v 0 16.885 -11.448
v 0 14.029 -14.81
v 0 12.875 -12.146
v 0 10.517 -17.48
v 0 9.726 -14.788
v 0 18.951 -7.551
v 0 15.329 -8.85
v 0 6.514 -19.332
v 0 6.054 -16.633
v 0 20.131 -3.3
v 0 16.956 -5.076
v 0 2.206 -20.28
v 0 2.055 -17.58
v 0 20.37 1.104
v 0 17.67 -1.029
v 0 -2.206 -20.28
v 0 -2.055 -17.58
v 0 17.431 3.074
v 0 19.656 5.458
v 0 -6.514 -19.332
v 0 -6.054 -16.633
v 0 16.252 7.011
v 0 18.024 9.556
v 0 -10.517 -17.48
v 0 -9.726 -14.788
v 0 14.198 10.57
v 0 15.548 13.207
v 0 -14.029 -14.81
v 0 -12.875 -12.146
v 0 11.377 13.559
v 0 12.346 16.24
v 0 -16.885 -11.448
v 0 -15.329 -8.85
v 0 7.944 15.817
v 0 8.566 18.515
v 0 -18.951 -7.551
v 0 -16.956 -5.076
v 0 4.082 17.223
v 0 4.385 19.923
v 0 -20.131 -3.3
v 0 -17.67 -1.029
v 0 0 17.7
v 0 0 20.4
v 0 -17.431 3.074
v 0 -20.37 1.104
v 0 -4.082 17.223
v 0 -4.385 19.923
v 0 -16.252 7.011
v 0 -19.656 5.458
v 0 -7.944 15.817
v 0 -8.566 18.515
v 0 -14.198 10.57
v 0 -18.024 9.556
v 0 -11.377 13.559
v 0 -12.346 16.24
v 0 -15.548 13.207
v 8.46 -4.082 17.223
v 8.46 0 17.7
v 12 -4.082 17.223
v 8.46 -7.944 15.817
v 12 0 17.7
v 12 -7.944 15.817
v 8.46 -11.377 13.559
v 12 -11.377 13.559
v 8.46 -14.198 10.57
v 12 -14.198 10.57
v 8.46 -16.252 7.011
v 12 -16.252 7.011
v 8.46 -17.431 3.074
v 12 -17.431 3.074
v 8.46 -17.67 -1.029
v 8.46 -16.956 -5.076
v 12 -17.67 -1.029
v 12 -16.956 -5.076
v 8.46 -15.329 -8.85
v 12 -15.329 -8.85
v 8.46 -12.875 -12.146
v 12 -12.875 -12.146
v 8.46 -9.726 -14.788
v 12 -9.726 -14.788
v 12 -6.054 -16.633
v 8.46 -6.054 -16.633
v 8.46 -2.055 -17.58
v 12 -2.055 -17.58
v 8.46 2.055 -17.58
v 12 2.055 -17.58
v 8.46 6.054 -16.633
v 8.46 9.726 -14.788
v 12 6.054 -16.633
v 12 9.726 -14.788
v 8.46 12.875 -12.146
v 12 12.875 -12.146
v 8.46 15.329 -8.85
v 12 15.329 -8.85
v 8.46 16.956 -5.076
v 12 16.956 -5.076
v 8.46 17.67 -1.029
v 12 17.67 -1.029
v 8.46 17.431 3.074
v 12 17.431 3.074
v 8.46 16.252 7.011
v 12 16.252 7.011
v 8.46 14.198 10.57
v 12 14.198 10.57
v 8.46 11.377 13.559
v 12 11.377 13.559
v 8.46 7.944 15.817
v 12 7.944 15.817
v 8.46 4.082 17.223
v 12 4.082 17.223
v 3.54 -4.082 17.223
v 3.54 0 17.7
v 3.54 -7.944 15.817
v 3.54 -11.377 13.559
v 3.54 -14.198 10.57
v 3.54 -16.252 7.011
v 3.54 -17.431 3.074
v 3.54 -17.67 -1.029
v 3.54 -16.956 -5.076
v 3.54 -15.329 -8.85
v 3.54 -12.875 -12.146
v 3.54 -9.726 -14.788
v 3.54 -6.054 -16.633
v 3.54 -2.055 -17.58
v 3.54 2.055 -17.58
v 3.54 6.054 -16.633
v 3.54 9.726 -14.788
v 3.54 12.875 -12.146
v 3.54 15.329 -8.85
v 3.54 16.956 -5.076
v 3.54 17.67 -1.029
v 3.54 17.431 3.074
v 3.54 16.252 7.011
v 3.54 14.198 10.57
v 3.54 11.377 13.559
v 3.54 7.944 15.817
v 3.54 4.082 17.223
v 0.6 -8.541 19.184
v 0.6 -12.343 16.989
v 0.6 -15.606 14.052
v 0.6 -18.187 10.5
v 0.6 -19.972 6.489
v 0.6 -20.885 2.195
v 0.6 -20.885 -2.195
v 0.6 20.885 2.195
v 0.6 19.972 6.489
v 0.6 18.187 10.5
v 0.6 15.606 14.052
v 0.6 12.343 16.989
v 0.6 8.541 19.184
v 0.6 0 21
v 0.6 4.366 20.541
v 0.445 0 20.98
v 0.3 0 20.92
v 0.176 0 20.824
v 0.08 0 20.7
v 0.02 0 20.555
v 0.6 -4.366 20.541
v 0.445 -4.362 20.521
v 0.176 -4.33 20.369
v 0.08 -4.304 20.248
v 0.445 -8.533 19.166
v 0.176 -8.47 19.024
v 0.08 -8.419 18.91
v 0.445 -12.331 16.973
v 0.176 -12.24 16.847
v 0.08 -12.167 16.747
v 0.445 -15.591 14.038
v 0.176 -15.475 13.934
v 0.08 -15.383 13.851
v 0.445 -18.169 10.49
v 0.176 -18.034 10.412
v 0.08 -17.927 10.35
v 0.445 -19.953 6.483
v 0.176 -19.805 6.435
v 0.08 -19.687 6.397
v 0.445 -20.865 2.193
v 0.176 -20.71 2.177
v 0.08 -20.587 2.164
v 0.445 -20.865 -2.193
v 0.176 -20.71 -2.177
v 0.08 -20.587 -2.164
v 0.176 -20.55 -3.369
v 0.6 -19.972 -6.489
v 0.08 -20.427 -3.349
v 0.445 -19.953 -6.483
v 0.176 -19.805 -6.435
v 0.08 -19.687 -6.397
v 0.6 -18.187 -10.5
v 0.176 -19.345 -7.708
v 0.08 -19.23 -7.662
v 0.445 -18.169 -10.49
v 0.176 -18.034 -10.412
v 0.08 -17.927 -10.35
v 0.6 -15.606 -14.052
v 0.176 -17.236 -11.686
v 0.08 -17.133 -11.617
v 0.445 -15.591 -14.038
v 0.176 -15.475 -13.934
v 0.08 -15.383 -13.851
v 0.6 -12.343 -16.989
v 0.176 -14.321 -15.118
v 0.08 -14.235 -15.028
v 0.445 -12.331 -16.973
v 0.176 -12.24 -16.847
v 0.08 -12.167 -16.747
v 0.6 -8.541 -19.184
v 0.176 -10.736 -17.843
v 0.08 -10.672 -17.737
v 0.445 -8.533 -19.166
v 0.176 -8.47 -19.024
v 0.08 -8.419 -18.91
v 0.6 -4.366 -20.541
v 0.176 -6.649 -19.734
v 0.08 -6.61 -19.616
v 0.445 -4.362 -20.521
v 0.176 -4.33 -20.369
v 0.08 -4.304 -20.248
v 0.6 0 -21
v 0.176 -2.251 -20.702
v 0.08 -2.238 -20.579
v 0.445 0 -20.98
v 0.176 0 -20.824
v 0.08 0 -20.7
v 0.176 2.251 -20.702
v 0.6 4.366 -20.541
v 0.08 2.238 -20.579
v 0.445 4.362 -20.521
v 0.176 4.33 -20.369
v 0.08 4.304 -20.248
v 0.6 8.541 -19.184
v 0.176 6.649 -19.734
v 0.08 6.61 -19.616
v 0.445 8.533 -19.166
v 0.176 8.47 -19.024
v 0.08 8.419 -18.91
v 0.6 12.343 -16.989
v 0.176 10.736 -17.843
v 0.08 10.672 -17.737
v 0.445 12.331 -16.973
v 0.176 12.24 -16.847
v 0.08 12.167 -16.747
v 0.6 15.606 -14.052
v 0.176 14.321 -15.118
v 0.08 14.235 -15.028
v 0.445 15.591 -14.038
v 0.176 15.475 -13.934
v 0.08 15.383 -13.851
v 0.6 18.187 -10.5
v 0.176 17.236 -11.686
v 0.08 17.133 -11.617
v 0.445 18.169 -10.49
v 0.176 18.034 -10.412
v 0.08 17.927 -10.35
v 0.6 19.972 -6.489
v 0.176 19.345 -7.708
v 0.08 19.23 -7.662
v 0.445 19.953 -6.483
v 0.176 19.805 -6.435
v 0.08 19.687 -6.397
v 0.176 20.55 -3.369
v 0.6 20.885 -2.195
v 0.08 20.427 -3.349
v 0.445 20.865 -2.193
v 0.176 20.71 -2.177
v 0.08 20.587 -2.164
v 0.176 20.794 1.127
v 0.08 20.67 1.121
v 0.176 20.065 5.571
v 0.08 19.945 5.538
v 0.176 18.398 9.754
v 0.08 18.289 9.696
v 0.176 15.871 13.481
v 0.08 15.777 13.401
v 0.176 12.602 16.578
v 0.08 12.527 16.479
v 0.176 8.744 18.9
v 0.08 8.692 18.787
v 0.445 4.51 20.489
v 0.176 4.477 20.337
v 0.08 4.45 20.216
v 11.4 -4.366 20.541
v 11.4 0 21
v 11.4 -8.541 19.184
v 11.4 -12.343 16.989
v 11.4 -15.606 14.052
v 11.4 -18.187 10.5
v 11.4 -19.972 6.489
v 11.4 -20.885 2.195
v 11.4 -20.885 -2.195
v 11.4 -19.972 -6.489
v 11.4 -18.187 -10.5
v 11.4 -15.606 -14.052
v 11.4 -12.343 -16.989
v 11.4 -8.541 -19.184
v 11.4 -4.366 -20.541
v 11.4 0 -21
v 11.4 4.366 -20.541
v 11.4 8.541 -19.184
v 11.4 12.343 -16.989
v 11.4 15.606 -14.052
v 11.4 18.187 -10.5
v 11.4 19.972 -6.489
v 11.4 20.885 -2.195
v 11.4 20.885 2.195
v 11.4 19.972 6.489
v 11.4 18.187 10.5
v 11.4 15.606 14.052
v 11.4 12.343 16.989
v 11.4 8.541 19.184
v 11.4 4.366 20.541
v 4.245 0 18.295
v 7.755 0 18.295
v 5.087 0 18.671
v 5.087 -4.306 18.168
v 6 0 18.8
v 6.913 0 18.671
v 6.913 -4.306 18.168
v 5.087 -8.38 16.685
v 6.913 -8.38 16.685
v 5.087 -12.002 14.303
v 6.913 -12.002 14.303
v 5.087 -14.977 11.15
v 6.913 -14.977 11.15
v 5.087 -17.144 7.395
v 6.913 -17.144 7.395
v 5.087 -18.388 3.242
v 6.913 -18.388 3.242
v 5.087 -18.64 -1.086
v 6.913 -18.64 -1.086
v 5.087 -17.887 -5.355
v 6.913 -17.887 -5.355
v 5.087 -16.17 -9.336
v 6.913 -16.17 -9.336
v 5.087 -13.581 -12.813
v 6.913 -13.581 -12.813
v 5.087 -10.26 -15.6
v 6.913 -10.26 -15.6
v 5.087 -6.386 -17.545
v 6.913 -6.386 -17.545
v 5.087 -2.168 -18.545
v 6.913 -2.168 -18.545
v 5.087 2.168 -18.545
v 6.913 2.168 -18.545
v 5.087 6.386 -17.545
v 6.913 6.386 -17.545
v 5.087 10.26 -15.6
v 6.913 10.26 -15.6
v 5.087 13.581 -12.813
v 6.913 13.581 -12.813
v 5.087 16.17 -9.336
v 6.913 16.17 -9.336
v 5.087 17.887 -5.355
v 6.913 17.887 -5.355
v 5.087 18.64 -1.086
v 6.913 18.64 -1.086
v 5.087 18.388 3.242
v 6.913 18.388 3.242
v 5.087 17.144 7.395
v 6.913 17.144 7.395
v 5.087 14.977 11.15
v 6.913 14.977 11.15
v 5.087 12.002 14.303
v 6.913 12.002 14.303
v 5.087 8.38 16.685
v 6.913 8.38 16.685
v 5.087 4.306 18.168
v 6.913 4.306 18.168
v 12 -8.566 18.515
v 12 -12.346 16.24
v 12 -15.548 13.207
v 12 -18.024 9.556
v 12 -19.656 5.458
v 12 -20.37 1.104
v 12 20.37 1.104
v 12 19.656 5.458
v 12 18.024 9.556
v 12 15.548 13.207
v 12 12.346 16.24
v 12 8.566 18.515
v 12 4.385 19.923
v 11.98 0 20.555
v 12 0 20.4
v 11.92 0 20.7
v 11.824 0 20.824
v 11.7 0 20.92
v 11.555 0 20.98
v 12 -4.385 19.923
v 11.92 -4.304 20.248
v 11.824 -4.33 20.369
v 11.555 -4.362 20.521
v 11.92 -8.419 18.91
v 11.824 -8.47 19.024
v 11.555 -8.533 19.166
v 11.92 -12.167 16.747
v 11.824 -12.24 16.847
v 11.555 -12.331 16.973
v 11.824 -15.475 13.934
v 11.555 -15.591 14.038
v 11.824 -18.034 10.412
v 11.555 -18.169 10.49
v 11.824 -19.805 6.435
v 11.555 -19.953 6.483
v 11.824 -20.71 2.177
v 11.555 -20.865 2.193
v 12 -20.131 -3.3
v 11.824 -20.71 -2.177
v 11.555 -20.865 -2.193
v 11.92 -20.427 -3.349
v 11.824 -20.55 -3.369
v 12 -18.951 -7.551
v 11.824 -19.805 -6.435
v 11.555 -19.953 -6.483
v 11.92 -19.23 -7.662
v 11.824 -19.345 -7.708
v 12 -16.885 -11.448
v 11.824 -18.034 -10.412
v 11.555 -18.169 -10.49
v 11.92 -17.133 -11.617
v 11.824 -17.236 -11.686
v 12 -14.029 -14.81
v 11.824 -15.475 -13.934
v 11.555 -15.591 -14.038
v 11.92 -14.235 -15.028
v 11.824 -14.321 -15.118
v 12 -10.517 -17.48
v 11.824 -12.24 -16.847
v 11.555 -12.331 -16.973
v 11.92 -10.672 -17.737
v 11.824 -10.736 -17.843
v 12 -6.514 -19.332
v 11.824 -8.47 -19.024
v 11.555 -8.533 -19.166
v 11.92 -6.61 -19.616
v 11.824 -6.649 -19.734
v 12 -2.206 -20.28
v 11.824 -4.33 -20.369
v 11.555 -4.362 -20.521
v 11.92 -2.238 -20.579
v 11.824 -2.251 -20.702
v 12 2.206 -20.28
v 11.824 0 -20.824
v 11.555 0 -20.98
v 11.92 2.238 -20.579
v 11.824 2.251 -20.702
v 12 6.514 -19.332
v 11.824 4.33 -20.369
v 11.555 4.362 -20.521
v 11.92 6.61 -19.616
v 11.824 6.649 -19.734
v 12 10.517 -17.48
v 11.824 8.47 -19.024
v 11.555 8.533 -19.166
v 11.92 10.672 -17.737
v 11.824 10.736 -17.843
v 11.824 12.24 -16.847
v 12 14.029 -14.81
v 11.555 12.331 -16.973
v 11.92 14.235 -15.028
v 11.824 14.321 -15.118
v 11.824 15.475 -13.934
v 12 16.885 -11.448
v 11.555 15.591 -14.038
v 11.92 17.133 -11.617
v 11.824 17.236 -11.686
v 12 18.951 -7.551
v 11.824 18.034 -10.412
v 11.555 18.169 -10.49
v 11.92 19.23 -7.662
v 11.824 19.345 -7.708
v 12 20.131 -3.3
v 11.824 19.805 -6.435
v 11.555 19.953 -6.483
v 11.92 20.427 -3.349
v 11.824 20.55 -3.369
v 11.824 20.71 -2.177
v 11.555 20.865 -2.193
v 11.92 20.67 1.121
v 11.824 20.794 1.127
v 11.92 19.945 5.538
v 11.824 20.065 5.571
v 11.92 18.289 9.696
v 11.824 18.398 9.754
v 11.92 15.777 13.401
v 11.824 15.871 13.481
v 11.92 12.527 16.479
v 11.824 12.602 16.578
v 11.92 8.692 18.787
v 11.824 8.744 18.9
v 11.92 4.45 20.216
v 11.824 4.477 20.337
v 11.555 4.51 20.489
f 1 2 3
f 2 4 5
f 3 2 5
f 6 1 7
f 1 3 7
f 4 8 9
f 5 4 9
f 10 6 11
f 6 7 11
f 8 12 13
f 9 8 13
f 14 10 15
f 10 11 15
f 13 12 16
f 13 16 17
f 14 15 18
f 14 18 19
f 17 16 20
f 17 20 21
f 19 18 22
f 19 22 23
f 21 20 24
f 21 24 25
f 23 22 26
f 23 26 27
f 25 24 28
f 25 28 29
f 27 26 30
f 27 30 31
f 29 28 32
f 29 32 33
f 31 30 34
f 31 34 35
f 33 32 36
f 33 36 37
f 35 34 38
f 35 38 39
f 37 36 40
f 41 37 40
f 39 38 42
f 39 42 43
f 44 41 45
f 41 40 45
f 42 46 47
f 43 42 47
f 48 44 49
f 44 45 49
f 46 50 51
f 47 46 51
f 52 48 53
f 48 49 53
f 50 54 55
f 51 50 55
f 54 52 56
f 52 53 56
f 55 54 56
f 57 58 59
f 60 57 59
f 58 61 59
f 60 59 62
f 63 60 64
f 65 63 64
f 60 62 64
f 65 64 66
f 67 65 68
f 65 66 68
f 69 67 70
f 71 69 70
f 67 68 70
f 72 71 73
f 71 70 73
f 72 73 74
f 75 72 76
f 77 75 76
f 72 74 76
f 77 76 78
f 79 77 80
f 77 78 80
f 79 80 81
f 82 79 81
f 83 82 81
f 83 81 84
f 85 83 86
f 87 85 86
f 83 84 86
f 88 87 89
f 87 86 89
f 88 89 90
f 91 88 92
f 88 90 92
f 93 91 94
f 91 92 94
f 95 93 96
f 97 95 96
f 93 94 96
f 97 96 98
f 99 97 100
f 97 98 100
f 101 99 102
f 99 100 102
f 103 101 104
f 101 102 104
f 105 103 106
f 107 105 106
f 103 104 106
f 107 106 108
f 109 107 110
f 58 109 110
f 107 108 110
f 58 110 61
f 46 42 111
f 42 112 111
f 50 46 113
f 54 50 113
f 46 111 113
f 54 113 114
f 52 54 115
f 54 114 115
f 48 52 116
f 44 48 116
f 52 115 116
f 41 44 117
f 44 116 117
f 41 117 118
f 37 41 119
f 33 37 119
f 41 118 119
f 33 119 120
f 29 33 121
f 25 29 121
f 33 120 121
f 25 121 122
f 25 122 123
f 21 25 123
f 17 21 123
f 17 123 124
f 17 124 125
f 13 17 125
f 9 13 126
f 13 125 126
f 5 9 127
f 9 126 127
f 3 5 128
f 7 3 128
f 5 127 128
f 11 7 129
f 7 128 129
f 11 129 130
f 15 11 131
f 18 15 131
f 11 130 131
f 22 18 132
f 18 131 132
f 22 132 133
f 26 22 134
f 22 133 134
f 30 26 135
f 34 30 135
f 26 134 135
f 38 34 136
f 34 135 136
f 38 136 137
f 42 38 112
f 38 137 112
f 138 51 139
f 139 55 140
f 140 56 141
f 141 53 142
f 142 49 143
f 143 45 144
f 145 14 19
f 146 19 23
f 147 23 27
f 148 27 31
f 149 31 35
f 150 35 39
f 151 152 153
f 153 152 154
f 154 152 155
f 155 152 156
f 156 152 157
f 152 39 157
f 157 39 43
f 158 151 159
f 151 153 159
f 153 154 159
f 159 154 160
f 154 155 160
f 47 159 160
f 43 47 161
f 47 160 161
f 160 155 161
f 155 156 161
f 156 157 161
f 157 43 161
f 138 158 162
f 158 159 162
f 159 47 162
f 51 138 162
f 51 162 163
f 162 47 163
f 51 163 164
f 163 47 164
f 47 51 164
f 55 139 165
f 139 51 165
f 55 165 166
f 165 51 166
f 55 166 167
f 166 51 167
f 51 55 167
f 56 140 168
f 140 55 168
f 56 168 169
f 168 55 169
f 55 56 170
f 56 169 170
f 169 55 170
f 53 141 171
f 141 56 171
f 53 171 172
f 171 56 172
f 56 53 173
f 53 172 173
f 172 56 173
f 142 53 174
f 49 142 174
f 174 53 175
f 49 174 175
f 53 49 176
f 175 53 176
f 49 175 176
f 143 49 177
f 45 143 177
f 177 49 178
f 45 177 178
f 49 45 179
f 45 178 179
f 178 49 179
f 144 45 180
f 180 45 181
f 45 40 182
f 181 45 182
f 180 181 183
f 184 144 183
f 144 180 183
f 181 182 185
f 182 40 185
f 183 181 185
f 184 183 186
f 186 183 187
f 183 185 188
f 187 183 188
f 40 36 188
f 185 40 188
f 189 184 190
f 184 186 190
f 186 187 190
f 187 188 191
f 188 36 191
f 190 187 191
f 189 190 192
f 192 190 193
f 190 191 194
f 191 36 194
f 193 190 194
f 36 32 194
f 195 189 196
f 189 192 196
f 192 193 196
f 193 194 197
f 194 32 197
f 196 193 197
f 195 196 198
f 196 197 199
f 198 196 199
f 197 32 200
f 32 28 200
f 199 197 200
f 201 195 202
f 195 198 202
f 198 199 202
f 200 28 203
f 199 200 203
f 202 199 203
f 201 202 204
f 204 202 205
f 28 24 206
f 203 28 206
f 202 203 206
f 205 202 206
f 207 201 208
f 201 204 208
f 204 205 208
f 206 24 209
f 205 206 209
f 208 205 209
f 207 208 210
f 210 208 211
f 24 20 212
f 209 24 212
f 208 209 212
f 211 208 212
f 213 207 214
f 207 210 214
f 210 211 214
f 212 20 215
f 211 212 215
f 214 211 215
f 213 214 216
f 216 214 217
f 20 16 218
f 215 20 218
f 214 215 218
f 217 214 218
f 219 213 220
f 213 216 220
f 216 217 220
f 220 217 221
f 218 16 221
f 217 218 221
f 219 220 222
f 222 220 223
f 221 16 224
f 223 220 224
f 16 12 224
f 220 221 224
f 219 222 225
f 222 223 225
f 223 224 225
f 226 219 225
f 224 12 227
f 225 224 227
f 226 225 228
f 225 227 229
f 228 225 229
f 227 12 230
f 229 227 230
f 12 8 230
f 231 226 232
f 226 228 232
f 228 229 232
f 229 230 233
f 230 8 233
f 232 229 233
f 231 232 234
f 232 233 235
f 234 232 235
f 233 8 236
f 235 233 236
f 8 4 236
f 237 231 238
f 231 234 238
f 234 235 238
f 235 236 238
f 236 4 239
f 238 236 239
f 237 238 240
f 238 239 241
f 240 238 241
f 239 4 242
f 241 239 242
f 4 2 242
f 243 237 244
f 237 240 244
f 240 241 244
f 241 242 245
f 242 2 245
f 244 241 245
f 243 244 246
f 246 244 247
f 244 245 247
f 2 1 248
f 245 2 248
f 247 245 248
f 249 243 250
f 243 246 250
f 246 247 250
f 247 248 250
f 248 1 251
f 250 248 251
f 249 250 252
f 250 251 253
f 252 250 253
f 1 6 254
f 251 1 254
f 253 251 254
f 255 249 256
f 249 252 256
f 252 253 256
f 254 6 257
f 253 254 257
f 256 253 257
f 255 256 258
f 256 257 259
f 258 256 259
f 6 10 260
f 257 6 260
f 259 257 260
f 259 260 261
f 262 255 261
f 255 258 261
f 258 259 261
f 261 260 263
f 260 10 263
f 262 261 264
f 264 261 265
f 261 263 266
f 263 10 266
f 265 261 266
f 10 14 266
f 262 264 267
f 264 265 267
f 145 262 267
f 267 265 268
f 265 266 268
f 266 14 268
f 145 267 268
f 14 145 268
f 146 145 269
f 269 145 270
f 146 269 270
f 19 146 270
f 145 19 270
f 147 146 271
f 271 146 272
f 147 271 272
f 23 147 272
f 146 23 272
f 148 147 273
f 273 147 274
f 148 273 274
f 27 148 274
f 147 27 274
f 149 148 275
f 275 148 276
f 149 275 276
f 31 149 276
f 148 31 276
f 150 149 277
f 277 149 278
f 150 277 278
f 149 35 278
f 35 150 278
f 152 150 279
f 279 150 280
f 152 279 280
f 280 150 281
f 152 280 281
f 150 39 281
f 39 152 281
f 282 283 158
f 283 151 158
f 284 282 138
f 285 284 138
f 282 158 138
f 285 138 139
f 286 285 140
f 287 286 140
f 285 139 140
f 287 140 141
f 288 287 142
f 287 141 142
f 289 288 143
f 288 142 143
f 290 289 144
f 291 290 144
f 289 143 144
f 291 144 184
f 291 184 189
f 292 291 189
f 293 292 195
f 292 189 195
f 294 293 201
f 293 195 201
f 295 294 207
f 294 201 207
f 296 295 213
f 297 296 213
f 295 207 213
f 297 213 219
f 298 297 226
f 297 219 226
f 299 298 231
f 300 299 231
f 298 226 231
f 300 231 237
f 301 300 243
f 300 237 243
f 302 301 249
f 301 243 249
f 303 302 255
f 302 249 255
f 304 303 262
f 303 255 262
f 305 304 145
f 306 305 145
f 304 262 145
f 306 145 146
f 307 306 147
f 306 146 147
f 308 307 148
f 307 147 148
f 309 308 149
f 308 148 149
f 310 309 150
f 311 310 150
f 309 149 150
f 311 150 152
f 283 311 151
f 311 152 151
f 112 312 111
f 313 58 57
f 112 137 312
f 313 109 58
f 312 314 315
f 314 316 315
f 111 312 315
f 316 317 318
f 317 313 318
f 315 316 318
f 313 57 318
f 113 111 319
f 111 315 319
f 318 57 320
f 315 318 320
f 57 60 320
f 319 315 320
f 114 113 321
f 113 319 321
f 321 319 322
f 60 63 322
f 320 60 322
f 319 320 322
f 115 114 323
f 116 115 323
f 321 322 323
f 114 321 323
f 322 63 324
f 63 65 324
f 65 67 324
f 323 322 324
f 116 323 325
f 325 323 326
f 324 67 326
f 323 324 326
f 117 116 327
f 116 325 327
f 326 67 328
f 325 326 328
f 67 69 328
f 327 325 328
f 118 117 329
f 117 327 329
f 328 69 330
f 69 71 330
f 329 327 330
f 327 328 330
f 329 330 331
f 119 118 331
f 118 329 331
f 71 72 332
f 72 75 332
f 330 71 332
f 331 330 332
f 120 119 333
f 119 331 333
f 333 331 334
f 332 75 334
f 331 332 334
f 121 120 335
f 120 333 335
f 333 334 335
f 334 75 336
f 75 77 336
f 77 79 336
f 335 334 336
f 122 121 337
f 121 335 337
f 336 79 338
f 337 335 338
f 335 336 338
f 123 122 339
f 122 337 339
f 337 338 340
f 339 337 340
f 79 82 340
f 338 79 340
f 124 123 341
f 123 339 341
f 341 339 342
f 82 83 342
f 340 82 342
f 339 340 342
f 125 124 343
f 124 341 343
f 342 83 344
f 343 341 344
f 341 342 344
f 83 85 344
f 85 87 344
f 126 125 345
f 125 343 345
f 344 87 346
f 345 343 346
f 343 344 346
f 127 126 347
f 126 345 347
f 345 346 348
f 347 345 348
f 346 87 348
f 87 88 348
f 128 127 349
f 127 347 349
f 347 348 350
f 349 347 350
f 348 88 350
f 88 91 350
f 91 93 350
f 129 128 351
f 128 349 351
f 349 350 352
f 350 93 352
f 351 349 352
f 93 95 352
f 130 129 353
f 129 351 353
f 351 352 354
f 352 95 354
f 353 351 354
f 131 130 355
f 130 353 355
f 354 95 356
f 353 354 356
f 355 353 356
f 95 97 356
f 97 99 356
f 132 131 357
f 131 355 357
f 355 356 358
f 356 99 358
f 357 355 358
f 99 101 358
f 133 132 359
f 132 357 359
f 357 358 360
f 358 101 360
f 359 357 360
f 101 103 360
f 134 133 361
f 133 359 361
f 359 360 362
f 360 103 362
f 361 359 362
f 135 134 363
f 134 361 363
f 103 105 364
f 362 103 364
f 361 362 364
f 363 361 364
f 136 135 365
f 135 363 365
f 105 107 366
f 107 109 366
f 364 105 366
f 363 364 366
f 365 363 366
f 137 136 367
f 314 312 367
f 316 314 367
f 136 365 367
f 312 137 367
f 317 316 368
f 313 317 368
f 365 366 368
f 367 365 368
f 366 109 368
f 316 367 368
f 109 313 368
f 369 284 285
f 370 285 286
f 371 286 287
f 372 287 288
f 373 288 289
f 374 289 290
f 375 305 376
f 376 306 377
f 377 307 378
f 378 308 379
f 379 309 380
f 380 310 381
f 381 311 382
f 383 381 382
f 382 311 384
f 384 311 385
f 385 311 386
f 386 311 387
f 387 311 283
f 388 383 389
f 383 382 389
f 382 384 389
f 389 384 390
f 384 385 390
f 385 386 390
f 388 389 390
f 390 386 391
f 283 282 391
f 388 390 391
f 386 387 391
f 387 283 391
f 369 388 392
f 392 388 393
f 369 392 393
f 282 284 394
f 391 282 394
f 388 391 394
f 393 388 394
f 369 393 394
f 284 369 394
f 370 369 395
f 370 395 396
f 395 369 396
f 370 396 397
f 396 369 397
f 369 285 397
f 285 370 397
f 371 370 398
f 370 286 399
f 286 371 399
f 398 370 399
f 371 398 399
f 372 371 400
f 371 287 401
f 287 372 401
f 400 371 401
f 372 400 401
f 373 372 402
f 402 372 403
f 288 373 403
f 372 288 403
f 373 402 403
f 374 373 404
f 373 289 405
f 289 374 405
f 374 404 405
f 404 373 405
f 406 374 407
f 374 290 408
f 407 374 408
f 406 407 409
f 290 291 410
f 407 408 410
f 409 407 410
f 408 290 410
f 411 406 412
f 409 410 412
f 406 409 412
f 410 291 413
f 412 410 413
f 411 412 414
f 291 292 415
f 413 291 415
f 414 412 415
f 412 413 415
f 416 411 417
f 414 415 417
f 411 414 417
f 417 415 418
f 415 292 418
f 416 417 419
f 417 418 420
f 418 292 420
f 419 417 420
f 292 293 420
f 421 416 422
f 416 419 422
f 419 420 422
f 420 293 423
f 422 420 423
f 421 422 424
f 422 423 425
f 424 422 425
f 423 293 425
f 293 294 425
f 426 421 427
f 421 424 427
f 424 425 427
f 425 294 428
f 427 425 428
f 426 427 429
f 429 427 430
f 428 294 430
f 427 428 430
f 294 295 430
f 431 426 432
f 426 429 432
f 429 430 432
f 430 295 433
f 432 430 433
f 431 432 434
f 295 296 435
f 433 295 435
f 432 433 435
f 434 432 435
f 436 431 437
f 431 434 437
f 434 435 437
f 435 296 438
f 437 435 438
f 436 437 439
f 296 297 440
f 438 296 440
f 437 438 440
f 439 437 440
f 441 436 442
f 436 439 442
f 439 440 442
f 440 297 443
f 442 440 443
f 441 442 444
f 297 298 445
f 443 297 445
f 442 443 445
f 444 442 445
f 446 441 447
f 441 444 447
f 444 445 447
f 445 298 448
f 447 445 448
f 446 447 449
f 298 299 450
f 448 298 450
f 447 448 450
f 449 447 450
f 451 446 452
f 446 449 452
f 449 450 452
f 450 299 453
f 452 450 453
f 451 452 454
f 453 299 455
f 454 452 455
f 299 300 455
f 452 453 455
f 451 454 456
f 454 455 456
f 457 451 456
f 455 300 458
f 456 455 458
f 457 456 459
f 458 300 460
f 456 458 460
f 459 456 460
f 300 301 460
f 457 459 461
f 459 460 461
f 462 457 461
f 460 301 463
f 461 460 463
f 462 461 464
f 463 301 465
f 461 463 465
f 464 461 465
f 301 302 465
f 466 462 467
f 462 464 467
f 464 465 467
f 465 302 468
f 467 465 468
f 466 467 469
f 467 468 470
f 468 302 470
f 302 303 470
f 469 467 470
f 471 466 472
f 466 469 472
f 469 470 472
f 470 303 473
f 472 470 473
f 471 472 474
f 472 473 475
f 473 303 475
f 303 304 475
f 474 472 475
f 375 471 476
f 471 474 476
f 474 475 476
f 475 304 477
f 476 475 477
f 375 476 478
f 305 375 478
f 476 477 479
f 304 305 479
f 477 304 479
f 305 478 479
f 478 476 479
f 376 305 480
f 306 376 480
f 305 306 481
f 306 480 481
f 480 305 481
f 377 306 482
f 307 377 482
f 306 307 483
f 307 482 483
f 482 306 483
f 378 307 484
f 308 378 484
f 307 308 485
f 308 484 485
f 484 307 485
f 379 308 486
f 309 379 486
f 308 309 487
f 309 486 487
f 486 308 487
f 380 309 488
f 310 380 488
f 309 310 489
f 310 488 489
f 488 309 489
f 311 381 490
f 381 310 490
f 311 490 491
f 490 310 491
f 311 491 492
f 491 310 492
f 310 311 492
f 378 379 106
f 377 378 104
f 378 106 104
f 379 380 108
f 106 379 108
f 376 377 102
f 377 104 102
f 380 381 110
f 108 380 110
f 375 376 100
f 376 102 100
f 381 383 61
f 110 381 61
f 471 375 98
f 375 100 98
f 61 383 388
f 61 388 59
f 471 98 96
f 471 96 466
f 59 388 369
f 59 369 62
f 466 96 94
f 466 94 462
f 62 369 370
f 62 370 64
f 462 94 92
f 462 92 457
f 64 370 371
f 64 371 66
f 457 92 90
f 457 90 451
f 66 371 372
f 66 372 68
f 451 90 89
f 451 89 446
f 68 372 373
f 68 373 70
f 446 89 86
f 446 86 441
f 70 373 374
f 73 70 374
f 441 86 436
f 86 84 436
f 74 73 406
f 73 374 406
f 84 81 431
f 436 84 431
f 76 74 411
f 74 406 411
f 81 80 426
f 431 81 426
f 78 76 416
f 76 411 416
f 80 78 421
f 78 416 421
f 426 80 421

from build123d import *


with BuildPart() as part:
    # Esquisse1 → Base-Révolution (revolve)
    with BuildSketch(Plane(origin=(0, 0, 0), x_dir=(1, 0, 0), z_dir=(0, 1, 0))):
        with BuildLine():
            Line((0, 20.4), (0, 17.7))
            Line((0, 17.7), (3.540325225, 17.7))
            ThreePointArc((3.540325225, 17.7), (6, 18.8), (8.459674775, 17.7))
            Line((8.459674775, 17.7), (12, 17.7))
            Line((12, 17.7), (12, 20.4))
            ThreePointArc((12, 20.4), (11.824264069, 20.824264069), (11.4, 21))
            Line((11.4, 21), (0.6, 21))
            ThreePointArc((0.6, 21), (0.175735931, 20.824264069), (0, 20.4))
        make_face()
    revolve(axis=Axis((0, 0, 0), (1, 0, 0)))


solid = part.part
